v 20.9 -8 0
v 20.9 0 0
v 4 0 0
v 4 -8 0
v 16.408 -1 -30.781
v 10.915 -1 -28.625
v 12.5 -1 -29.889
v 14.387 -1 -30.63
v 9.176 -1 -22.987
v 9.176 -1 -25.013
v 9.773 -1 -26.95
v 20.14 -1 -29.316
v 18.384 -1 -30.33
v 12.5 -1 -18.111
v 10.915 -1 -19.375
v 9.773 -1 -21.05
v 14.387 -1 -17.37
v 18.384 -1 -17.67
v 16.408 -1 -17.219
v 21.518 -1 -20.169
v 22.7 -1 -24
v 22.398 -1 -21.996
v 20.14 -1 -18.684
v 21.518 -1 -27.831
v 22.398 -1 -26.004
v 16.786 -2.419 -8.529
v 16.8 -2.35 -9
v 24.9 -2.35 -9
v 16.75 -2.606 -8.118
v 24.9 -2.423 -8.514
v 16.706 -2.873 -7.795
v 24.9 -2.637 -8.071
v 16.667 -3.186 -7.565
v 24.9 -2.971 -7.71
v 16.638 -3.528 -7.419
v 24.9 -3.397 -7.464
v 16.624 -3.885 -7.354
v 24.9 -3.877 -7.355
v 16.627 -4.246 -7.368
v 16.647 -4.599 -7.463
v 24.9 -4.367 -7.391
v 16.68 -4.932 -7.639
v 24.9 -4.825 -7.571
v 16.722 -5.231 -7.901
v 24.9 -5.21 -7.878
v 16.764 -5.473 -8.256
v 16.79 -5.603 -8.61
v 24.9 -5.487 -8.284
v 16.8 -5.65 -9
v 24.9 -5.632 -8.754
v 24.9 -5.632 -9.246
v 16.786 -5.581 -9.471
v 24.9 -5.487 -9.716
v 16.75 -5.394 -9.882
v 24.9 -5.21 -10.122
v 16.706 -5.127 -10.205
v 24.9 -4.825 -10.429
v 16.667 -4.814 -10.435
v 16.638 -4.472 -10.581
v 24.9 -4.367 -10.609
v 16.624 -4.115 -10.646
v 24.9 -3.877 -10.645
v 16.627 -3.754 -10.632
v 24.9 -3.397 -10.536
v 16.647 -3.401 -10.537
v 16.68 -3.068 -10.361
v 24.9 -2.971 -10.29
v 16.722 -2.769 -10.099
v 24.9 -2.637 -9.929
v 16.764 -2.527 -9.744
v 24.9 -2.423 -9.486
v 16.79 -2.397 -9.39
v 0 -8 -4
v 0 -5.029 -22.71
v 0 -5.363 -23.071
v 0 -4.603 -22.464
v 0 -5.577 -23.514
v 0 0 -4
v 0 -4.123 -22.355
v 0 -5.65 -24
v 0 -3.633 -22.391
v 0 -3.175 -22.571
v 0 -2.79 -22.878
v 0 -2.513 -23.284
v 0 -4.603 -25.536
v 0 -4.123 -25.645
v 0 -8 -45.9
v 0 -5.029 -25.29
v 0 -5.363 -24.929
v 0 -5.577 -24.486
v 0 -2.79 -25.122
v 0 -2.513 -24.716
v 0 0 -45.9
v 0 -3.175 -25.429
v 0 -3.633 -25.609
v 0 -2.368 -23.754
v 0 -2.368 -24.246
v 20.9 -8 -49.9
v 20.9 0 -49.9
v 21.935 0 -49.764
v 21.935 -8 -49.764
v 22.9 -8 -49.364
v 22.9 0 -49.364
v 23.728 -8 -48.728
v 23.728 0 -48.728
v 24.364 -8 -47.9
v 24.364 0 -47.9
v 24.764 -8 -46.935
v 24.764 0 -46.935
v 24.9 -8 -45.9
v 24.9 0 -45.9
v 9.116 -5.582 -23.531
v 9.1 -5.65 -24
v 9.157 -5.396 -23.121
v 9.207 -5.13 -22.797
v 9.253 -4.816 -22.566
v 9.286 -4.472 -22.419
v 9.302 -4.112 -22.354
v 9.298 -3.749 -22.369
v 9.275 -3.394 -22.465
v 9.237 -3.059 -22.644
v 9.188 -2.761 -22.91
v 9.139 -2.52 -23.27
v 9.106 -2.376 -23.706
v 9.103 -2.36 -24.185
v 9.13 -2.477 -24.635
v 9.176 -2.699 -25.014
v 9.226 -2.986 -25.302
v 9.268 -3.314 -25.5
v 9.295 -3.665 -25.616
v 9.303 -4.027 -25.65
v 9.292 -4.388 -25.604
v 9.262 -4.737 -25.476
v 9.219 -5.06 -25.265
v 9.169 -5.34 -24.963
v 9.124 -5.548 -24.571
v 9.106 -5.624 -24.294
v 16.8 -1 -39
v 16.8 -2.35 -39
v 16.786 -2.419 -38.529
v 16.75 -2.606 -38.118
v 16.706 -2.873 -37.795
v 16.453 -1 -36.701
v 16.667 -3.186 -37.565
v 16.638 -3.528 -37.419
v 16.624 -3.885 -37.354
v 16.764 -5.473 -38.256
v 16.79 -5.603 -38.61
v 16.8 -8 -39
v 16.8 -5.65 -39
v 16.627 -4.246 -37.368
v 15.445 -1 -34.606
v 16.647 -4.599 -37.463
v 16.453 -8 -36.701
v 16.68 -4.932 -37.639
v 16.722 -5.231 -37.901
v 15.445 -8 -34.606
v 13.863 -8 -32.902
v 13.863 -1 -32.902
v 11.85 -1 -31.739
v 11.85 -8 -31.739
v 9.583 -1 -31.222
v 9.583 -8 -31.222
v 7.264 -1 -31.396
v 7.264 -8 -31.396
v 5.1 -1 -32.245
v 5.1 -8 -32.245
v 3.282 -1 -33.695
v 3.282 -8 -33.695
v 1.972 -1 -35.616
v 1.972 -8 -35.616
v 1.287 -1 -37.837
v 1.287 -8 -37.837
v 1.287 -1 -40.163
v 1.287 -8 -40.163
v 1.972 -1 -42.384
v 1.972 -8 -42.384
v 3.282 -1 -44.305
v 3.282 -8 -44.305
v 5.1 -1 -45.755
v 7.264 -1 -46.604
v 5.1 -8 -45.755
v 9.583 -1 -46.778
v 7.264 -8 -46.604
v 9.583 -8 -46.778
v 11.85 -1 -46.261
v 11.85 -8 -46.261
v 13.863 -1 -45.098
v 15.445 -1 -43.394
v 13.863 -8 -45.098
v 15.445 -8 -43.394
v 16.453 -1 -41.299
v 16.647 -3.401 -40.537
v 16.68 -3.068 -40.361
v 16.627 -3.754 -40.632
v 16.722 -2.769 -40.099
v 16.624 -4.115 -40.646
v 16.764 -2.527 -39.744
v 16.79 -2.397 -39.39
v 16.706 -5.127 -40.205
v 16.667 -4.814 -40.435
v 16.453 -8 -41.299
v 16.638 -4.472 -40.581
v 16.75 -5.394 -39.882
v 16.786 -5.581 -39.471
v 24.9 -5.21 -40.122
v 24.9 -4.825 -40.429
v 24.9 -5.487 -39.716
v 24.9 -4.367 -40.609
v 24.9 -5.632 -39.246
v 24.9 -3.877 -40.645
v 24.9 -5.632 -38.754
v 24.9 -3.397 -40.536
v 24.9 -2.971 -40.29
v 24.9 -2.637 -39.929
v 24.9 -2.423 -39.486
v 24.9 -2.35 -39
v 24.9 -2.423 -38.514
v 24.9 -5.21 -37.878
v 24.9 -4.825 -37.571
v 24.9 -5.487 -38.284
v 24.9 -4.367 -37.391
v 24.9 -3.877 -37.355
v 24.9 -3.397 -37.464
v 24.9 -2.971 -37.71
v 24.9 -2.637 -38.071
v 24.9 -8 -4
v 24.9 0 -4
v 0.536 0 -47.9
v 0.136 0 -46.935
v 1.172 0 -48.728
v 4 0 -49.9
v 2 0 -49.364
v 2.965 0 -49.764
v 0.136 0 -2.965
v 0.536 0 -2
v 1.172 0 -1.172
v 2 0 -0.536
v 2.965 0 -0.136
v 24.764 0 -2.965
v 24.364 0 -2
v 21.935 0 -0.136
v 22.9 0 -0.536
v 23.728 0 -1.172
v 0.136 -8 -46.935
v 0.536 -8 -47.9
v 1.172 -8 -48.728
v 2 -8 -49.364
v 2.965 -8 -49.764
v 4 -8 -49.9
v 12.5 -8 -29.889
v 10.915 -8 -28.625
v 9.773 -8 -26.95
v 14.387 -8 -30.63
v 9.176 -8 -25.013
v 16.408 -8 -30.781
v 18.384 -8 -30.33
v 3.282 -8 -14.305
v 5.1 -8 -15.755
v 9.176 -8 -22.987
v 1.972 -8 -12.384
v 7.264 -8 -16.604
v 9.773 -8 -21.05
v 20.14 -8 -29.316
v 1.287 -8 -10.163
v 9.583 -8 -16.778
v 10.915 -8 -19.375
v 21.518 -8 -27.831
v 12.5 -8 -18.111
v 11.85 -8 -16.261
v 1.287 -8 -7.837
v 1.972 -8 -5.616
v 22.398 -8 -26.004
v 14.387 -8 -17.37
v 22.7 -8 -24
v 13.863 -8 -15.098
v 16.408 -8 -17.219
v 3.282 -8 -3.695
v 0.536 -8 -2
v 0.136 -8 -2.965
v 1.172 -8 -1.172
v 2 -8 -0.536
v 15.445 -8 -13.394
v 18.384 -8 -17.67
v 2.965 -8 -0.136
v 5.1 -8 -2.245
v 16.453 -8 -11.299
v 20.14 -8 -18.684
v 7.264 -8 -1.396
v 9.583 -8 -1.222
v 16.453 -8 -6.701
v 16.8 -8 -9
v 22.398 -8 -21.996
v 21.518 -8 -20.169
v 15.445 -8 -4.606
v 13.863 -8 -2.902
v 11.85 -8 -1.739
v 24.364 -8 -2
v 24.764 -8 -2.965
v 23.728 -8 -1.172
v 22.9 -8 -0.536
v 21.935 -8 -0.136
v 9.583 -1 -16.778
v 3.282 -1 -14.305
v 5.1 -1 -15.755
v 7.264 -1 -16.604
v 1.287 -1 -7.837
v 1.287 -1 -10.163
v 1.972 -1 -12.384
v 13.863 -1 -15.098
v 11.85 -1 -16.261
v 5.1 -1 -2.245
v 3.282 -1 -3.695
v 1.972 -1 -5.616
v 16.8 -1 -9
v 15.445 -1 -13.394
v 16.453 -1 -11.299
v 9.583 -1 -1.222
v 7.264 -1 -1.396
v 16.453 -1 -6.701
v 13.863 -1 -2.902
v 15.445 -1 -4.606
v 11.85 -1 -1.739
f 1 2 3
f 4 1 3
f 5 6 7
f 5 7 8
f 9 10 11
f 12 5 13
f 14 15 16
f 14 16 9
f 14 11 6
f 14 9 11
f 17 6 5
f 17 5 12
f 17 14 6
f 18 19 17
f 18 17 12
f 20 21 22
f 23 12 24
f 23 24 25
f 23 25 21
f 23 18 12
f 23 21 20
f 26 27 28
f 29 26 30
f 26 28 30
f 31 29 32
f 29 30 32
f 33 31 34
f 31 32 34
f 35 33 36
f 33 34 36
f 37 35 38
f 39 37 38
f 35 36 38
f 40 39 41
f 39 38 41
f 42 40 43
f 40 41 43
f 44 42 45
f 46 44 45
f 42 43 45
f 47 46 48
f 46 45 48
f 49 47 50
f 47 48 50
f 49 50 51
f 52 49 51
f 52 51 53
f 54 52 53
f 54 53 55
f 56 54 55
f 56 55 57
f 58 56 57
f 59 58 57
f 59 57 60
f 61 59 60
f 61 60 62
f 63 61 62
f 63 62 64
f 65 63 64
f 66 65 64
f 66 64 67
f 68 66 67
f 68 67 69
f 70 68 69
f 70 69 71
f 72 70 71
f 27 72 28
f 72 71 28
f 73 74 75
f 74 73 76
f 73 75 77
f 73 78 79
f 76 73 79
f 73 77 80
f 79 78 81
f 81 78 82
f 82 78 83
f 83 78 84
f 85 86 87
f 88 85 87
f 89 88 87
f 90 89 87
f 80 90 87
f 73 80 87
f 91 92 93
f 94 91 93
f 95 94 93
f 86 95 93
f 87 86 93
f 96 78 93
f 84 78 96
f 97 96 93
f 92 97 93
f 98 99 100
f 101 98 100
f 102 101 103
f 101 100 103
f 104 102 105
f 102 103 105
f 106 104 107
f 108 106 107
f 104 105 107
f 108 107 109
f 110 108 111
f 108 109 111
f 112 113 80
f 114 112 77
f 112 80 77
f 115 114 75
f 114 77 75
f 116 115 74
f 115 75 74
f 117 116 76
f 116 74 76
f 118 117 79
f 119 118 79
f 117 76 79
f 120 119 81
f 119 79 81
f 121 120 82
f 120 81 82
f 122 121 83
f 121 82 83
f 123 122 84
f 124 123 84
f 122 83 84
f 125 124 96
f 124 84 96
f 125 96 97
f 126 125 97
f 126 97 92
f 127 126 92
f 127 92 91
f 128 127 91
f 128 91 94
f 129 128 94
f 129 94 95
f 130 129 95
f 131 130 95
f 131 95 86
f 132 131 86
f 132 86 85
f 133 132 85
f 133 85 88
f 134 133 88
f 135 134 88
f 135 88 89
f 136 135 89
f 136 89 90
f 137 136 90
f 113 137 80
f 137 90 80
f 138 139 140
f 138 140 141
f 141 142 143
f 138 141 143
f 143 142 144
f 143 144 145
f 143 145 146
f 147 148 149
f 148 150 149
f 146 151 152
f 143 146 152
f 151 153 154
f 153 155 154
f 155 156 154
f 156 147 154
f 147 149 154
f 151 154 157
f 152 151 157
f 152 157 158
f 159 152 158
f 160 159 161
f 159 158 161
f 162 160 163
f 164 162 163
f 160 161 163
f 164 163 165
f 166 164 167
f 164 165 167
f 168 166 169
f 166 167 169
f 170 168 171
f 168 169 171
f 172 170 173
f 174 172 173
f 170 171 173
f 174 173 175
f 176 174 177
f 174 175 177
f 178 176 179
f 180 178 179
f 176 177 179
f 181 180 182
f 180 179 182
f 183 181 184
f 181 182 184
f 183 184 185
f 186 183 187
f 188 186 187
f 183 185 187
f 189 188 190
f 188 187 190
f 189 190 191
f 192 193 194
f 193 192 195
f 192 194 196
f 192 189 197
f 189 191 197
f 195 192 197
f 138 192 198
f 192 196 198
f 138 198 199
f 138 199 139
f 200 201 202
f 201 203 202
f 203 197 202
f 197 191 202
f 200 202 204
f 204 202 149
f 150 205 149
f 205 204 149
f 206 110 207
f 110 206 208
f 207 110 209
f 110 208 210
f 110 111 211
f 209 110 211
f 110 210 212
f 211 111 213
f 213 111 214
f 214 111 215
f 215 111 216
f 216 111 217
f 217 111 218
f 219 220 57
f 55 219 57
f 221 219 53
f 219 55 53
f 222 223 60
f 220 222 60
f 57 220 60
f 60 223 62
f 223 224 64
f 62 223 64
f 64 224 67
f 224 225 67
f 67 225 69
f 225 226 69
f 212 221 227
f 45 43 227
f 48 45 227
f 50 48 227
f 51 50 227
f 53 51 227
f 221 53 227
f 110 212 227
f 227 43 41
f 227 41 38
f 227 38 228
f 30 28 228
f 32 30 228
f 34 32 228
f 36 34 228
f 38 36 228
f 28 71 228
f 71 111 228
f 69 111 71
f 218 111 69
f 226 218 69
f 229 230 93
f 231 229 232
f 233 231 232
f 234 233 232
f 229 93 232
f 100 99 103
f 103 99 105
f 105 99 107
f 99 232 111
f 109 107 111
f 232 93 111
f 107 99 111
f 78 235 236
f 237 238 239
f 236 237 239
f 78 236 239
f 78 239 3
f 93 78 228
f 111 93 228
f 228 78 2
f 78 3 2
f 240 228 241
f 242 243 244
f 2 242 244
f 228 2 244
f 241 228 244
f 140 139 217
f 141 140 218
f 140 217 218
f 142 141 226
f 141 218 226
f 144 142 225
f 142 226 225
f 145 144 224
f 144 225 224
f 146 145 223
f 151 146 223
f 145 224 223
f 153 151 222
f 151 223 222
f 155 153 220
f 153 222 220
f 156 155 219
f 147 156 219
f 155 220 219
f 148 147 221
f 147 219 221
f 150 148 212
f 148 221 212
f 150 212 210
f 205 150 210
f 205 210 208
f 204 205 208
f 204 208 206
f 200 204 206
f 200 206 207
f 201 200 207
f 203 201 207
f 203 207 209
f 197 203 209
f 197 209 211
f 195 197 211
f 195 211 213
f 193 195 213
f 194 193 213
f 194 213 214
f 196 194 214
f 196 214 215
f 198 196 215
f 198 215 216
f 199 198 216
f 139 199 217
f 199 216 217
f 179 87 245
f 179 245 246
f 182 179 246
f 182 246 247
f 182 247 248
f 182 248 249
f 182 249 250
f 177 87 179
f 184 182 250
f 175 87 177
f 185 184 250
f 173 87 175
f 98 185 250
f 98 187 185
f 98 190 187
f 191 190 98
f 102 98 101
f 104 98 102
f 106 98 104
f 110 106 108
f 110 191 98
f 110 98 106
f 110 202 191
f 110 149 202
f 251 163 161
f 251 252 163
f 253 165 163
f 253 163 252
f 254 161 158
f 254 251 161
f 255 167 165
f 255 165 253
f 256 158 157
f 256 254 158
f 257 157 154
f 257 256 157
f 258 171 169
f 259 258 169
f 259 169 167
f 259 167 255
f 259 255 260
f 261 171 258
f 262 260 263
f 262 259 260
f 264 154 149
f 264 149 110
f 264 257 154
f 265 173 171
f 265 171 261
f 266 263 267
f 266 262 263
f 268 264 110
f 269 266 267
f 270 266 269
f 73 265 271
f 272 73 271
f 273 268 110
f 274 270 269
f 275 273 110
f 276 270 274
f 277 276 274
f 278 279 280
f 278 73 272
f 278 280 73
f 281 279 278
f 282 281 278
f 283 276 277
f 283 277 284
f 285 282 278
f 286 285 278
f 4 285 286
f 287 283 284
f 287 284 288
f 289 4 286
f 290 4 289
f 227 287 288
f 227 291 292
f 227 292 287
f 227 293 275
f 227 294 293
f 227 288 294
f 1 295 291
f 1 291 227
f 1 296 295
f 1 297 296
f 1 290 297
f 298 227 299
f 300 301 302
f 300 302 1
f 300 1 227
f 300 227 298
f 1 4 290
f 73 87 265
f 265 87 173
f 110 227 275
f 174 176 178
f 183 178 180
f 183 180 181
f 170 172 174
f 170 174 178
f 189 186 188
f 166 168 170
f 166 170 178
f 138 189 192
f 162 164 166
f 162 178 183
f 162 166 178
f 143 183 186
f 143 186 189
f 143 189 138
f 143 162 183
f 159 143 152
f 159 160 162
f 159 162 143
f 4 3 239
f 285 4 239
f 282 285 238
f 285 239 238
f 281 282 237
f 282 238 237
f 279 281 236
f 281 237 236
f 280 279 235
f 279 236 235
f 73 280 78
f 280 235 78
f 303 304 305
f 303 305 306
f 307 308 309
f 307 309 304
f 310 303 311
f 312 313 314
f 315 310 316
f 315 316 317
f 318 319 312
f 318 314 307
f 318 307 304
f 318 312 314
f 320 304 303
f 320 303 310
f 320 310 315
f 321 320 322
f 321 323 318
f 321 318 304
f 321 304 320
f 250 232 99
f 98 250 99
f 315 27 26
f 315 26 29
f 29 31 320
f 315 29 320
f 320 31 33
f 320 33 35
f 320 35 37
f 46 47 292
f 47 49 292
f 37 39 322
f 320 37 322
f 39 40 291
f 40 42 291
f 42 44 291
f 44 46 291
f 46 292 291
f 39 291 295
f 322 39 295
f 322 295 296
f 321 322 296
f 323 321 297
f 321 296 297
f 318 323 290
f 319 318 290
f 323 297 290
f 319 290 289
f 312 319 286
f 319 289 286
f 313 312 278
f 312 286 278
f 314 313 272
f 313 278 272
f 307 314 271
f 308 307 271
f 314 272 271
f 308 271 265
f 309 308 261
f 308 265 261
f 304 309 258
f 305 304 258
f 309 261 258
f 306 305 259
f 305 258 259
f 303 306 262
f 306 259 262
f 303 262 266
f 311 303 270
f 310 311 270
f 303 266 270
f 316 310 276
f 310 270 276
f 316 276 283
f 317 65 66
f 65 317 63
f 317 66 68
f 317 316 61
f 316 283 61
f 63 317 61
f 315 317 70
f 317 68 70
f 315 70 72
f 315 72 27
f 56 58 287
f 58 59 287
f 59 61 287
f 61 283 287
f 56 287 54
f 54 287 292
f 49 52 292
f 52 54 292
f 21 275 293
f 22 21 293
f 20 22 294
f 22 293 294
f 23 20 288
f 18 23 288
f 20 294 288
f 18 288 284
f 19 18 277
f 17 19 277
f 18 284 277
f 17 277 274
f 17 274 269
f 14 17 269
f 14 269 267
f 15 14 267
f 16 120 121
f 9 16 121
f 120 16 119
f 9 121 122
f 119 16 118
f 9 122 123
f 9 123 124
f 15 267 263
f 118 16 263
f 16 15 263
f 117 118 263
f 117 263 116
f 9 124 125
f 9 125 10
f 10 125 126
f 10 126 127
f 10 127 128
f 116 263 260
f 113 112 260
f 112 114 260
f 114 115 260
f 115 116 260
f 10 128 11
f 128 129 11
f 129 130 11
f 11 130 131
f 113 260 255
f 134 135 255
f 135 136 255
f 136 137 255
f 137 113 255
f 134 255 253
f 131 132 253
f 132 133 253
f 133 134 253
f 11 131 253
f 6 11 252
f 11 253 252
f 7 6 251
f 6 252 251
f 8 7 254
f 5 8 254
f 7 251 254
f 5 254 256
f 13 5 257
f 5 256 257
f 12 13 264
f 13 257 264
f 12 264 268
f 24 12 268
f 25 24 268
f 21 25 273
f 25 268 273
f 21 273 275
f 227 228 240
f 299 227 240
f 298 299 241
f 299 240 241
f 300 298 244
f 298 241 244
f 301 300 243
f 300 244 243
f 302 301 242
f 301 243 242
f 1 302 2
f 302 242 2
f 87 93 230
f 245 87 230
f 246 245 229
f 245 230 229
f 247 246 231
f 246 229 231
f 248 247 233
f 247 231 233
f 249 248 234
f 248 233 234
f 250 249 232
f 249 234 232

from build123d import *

# Parameters (mm, degrees)
F1_DEPTH = 8
F2_R     = 7.8
F2_R_2   = 6.8
F3_DEPTH = 7
F4_R     = 1.65
F5_DEPTH = 8.2775166443
F6_R     = 1.65
F7_DEPTH = 9.3042205827


with BuildPart() as f1:
    # F0 (on Front) → F1 (new body)
    with BuildSketch(Plane.XZ):
        with BuildLine():
            Line((20.9, 0), (4, 0))
            ThreePointArc((4, 0), (1.1715728753, -1.1715728753), (0, -4))
            Line((0, -4), (0, -45.9))
            ThreePointArc((0, -45.9), (1.1715728753, -48.7284271247), (4, -49.9))
            Line((4, -49.9), (20.9, -49.9))
            ThreePointArc((20.9, -49.9), (23.7284271247, -48.7284271247), (24.9, -45.9))
            Line((24.9, -45.9), (24.9, -4))
            ThreePointArc((24.9, -4), (23.7284271247, -1.1715728753), (20.9, 0))
        make_face()
    extrude(amount=F1_DEPTH)

    # F2 (on face) → F3 (cut)
    with BuildSketch(Plane.XZ.offset(8)):
        with Locations((9, -9)):
            Circle(F2_R)
        with Locations((15.9, -24)):
            Circle(F2_R_2)
        with Locations((9, -39)):
            Circle(F2_R)
    extrude(amount=-F3_DEPTH, mode=Mode.SUBTRACT)

    # F4 (on face) → F5 (cut, through all)
    with BuildSketch(Plane.YZ.offset(24.9)):
        with Locations((-4, -39)):
            Circle(F4_R)
        with Locations((-4, -9)):
            Circle(F4_R)
    extrude(amount=-F5_DEPTH, mode=Mode.SUBTRACT)

    # F6 (on face) → F7 (cut, through all)
    with BuildSketch(Plane(origin=(0, 0, 0), x_dir=(0, -1, 0), z_dir=(-1, 0, 0))):
        with Locations((4, -24)):
            Circle(F6_R)
    extrude(amount=-F7_DEPTH, mode=Mode.SUBTRACT)


solid = f1.part
